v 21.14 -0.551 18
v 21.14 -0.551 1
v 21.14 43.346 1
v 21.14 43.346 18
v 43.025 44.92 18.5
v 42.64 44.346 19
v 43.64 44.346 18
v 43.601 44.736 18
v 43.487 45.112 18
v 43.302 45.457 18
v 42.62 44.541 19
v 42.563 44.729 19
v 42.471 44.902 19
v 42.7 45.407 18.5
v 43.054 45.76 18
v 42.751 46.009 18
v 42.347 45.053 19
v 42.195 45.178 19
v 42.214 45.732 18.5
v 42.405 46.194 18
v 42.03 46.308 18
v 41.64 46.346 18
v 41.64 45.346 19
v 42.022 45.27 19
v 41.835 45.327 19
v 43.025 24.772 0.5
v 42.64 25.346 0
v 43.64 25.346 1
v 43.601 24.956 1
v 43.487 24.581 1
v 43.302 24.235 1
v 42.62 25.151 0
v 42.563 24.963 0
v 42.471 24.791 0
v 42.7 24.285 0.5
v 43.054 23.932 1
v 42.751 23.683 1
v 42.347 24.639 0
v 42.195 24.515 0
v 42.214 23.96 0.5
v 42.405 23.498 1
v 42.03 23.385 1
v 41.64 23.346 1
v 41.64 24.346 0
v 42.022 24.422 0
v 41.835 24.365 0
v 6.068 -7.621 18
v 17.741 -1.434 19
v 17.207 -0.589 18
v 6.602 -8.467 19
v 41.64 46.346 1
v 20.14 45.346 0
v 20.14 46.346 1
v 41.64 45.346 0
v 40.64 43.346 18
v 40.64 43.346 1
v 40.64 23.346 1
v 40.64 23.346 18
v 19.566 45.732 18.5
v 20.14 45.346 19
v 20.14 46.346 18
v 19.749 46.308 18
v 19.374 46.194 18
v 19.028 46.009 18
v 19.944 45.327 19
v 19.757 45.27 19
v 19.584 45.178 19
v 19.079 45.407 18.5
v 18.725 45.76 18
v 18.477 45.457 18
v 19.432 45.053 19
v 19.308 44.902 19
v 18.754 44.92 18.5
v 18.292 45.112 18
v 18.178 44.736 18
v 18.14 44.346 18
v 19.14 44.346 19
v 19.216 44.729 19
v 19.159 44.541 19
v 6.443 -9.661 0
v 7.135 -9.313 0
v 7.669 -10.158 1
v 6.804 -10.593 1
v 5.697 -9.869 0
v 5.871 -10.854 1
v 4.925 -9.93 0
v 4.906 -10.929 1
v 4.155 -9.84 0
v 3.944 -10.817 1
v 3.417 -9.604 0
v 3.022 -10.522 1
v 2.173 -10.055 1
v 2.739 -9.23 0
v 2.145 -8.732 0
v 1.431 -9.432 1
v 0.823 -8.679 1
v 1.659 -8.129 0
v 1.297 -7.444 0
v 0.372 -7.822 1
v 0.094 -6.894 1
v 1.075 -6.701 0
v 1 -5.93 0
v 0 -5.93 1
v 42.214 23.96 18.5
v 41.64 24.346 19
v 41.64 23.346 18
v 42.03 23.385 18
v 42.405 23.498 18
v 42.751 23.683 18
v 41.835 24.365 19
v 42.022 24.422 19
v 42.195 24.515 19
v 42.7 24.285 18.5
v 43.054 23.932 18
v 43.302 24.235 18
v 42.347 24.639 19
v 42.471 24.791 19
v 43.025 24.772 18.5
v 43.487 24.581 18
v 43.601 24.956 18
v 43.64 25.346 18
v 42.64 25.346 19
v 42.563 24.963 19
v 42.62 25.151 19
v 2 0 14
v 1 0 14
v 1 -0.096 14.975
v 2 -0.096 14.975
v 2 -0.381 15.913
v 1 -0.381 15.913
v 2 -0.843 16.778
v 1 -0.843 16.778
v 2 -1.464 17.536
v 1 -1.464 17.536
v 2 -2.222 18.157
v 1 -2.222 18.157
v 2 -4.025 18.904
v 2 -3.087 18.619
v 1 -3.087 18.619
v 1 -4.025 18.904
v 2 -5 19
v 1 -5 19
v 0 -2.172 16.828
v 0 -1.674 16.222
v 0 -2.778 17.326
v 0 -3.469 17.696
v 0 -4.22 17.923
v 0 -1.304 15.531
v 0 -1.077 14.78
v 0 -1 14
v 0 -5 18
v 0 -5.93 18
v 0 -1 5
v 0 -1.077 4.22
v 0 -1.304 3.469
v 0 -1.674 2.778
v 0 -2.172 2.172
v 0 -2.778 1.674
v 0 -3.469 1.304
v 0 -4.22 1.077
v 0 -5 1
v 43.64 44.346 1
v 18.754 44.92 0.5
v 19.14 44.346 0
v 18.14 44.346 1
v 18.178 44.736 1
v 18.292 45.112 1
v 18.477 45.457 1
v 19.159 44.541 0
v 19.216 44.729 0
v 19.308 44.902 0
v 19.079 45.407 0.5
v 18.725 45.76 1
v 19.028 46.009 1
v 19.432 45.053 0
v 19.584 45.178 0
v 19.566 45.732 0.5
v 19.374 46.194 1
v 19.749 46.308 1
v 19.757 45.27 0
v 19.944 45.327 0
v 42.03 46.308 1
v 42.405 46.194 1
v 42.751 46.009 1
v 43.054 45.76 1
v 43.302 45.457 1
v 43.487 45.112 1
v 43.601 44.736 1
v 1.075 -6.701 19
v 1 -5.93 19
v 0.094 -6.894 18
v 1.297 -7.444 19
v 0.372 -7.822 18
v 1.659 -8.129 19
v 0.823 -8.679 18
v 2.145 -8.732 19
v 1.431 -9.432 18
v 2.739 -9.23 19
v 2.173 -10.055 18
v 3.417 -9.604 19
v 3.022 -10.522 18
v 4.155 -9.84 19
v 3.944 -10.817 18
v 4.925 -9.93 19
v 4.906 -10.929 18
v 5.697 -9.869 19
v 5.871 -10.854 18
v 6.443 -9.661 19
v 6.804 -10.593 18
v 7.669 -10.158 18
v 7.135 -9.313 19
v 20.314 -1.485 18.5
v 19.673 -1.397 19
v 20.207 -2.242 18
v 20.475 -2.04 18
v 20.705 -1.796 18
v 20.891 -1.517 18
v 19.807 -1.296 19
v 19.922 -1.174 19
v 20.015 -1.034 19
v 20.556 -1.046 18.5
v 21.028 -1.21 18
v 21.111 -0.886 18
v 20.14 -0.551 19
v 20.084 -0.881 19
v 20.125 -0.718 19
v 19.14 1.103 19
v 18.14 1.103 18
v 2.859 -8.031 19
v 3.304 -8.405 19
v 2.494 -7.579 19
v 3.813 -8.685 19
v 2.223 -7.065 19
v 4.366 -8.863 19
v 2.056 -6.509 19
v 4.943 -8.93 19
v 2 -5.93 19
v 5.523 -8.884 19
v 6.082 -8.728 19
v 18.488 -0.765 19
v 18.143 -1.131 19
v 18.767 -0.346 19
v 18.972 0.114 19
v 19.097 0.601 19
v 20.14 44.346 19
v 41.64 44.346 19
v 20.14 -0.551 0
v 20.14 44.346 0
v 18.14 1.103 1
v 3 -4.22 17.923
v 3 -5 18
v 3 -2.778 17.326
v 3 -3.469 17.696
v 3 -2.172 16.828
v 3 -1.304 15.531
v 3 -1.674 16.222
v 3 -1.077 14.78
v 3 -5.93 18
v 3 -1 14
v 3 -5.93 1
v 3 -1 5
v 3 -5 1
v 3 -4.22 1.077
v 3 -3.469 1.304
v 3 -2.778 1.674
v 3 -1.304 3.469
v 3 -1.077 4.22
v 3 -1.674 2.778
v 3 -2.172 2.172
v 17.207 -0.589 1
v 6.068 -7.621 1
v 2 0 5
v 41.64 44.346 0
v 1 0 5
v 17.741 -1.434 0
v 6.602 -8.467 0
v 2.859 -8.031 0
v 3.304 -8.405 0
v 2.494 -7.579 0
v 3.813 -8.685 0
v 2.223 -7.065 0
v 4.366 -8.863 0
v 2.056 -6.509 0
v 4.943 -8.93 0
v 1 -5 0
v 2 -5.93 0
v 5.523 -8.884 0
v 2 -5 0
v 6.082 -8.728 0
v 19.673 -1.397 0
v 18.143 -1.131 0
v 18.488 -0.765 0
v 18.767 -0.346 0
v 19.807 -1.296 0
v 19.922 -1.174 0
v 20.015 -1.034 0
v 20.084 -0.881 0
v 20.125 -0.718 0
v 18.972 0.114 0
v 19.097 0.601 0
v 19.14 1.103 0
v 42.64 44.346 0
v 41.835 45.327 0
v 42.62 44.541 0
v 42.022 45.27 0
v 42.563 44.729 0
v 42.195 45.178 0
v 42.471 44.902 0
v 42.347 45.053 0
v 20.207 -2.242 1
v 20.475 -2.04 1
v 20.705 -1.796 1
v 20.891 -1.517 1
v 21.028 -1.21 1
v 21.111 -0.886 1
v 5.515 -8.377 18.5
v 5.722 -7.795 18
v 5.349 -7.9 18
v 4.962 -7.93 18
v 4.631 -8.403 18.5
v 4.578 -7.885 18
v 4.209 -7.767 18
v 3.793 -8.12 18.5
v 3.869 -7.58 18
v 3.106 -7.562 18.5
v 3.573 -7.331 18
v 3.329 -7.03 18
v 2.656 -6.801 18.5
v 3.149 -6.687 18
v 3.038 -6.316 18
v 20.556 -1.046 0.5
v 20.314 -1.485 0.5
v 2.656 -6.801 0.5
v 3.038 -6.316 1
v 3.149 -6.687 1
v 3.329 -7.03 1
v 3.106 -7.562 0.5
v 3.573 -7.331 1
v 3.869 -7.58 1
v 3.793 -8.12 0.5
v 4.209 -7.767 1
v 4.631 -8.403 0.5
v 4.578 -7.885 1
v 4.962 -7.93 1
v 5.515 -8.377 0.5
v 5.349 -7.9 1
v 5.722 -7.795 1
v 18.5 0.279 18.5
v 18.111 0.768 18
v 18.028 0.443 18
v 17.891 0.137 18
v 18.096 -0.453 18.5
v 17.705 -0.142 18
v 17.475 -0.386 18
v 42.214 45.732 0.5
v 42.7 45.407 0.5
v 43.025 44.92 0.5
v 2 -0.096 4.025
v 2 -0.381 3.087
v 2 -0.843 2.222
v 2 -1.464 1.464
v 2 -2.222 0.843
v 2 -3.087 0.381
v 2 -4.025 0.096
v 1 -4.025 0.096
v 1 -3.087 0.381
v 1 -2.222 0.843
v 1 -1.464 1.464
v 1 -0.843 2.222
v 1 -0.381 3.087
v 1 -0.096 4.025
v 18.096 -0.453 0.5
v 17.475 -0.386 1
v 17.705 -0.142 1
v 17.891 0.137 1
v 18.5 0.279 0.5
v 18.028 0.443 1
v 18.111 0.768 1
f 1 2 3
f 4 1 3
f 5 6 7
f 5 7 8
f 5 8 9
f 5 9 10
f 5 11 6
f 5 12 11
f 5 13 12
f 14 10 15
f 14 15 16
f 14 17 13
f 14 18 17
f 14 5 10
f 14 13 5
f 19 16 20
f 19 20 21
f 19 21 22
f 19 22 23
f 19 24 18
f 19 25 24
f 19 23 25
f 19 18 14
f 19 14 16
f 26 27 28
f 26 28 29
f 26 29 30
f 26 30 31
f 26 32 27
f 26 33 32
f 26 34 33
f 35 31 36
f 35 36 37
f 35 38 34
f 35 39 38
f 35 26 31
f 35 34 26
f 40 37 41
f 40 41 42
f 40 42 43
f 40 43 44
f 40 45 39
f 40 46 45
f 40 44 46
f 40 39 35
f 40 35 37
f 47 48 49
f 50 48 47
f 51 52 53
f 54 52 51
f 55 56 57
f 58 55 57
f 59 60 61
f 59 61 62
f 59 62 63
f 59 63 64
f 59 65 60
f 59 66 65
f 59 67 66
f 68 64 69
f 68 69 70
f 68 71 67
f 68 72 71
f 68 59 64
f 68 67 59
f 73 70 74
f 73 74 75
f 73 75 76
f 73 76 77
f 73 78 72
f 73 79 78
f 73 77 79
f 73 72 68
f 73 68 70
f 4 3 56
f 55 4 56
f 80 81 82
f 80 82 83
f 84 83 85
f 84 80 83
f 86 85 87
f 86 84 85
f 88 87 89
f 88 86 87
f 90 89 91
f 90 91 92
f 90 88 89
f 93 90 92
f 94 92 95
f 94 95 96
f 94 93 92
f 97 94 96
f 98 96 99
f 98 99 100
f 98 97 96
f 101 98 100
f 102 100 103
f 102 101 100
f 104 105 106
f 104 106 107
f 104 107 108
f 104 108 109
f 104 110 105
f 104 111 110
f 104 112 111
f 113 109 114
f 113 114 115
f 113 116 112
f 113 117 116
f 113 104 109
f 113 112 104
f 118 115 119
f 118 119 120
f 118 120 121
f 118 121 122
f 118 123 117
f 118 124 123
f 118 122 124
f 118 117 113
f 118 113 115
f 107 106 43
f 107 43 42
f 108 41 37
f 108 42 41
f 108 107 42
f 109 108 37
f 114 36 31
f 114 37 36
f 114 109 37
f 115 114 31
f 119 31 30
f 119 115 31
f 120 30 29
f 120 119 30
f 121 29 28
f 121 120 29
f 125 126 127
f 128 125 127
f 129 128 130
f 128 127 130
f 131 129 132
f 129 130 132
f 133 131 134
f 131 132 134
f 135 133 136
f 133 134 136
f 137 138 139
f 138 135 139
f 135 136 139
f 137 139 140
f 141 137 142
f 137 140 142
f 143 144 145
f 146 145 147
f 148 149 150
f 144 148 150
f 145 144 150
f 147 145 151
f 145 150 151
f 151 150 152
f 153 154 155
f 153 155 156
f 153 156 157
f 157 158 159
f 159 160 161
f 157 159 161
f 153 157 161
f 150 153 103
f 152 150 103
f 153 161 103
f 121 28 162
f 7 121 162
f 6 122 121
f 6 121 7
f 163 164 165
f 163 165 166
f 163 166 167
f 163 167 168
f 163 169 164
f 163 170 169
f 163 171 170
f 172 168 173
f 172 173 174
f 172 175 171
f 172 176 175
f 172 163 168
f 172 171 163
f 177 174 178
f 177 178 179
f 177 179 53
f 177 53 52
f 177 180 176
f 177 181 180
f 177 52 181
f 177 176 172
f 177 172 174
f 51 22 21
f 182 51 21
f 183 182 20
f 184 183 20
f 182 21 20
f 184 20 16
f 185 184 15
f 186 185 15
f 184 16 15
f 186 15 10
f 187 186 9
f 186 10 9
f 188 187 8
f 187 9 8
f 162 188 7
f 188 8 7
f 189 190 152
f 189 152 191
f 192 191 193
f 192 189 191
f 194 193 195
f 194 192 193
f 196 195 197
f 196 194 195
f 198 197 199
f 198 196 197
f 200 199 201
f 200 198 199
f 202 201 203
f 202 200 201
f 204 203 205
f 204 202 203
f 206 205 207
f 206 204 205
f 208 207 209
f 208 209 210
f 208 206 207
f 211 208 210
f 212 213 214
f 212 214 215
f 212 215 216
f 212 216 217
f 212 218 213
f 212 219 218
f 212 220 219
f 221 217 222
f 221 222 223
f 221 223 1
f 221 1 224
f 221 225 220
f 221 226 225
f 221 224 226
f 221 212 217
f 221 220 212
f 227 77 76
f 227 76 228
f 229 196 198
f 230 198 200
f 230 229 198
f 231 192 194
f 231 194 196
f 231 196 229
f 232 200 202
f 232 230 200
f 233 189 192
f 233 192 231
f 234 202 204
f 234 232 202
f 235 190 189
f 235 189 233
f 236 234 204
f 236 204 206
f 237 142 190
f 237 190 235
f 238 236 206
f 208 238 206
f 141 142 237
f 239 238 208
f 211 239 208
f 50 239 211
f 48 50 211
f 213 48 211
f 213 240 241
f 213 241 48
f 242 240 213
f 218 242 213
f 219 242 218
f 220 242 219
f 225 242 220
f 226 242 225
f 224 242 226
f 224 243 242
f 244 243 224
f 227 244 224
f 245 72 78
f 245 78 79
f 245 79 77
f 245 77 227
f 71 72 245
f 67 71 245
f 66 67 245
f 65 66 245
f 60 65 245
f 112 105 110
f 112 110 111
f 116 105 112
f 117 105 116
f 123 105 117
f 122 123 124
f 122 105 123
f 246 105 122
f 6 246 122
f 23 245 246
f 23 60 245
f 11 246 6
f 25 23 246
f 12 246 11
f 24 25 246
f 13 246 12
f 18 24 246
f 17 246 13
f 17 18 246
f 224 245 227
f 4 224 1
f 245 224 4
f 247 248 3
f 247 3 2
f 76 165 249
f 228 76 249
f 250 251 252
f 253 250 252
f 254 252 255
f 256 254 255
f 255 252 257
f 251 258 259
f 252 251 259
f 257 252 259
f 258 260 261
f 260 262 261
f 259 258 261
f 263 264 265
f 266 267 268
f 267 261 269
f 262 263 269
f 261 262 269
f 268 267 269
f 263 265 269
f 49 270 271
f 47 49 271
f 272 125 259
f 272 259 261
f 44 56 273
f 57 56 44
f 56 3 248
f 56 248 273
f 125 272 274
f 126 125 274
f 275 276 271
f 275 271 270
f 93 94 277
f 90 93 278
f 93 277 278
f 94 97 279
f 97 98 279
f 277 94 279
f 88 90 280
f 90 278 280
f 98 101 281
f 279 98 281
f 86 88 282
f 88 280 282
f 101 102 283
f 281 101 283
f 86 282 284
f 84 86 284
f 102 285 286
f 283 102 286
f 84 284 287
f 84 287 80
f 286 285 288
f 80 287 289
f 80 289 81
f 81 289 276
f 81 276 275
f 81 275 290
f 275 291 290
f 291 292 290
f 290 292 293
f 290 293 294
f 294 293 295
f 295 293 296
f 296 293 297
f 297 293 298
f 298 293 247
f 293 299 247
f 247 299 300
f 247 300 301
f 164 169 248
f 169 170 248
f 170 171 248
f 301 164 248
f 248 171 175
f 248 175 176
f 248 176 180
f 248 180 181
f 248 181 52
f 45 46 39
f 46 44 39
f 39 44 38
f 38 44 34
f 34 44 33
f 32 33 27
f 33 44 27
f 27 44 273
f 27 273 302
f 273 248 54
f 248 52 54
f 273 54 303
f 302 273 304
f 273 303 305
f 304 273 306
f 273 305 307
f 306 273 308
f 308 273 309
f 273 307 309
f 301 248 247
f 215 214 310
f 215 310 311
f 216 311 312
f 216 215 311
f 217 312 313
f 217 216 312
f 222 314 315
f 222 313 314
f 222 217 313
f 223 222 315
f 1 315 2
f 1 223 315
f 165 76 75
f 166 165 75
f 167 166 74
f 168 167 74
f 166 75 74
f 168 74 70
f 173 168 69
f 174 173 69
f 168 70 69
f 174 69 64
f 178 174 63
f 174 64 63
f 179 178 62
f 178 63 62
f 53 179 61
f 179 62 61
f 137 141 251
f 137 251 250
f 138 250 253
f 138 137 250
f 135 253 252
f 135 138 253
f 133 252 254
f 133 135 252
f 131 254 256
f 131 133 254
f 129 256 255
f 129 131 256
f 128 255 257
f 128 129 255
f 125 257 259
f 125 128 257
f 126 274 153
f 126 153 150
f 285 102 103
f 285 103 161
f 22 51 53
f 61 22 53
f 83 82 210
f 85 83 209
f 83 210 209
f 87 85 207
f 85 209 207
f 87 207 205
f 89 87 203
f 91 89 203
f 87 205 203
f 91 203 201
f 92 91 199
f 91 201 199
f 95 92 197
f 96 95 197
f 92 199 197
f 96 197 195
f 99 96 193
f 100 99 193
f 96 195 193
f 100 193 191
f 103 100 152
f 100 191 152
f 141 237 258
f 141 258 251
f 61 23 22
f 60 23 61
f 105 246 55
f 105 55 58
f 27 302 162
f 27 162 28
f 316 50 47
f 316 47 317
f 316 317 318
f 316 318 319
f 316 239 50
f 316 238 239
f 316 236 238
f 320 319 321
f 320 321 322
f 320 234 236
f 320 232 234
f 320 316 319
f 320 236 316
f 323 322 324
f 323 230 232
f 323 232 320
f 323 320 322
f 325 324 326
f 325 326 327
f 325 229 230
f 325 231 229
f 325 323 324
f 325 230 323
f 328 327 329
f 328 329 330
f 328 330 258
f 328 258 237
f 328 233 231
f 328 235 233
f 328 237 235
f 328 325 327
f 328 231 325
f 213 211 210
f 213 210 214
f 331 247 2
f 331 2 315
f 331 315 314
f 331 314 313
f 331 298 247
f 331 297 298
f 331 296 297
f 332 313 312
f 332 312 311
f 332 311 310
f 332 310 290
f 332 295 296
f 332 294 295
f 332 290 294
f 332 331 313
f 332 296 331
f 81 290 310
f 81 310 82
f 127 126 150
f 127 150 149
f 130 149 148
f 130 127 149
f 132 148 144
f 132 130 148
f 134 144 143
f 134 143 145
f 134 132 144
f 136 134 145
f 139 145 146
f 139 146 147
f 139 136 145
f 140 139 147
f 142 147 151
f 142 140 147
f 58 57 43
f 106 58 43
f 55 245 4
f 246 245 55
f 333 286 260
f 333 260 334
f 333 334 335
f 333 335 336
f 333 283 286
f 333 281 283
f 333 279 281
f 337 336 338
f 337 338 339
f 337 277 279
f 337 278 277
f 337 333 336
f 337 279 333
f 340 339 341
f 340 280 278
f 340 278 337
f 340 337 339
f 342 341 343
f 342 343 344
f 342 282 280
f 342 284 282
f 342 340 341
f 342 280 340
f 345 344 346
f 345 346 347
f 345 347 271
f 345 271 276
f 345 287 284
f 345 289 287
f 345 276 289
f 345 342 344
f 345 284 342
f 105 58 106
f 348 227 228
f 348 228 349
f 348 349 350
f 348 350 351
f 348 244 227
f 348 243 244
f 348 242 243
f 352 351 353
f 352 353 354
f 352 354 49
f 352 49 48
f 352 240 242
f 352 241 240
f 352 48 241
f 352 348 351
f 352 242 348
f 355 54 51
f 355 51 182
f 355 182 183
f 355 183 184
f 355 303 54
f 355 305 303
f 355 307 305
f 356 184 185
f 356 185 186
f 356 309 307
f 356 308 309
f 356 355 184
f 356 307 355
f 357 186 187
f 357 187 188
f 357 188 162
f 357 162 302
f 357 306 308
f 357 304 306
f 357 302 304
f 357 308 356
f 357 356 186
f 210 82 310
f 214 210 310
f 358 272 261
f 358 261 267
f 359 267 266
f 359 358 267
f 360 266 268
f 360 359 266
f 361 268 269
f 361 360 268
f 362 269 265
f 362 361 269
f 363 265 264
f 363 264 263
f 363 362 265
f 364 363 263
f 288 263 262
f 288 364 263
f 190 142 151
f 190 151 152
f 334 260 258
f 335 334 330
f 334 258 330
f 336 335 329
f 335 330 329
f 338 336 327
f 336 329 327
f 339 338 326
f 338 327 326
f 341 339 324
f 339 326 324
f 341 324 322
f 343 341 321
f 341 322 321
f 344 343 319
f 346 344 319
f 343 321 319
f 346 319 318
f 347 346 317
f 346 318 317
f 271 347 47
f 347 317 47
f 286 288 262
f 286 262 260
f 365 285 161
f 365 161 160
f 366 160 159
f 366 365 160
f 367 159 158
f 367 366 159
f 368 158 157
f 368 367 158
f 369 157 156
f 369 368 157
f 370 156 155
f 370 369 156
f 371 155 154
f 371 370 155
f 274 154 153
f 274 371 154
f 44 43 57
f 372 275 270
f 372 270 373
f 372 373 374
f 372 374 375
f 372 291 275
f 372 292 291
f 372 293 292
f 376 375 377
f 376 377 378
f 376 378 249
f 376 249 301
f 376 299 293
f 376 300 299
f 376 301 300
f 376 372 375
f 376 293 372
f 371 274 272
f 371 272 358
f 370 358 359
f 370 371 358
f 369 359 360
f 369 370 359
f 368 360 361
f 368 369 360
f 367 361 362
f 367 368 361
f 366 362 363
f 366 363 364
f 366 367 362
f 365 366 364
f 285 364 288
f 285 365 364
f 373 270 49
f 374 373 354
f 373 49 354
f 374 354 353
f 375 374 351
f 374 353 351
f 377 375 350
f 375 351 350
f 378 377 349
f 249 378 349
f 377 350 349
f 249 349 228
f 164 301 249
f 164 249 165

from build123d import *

# Parameters (mm, degrees)
F1_DEPTH = 19
F2_R     = 5
F3_R     = 2
F4_R     = 5
F5_SIZE  = 1


with BuildPart() as f1:
    # F0 (on Top) → F1 (new body)
    with BuildSketch(Plane.XY):
        Polygon((3, 0), (0, 0), (0, -15), (21.13954, -1.653846), (21.13954, 43.346154), (40.63954, 43.346154), (40.63954, 23.346154), (43.63954, 23.346154), (43.63954, 46.346154), (18.13954, 46.346154), (18.13954, 0), (3, -9.558138), align=None)
    extrude(amount=F1_DEPTH)

    # F2
    f2_edges = [f1.edges().sort_by_distance(p)[0] for p in [
        (1.5, 0, 0),
        (1.5, 0, 19),
    ]]
    fillet(f2_edges, radius=F2_R)

    # F3
    f3_edges = [f1.edges().sort_by_distance(p)[0] for p in [
        (18.13954, 46.346154, 9.5),
        (3, -9.558138, 9.5),
        (43.63954, 23.346154, 9.5),
        (18.13954, 0, 9.5),
        (21.13954, -1.653846, 9.5),
        (43.63954, 46.346154, 9.5),
    ]]
    fillet(f3_edges, radius=F3_R)

    # F4
    f4_edges = [f1.edges().sort_by_distance(p)[0] for p in [
        (0, -15, 9.5),
    ]]
    fillet(f4_edges, radius=F4_R)

    # F5
    f5_edges = [f1.edges().sort_by_distance(p)[0] for p in [
        (13.938232, -6.200292, 19),
        (11.637462, -4.104996, 19),
        (30.88954, 43.346154, 0),
        (40.63954, 33.346154, 0),
        (30.88954, 43.346154, 19),
        (40.63954, 33.346154, 19),
    ]]
    chamfer(f5_edges, length=F5_SIZE)


solid = f1.part
